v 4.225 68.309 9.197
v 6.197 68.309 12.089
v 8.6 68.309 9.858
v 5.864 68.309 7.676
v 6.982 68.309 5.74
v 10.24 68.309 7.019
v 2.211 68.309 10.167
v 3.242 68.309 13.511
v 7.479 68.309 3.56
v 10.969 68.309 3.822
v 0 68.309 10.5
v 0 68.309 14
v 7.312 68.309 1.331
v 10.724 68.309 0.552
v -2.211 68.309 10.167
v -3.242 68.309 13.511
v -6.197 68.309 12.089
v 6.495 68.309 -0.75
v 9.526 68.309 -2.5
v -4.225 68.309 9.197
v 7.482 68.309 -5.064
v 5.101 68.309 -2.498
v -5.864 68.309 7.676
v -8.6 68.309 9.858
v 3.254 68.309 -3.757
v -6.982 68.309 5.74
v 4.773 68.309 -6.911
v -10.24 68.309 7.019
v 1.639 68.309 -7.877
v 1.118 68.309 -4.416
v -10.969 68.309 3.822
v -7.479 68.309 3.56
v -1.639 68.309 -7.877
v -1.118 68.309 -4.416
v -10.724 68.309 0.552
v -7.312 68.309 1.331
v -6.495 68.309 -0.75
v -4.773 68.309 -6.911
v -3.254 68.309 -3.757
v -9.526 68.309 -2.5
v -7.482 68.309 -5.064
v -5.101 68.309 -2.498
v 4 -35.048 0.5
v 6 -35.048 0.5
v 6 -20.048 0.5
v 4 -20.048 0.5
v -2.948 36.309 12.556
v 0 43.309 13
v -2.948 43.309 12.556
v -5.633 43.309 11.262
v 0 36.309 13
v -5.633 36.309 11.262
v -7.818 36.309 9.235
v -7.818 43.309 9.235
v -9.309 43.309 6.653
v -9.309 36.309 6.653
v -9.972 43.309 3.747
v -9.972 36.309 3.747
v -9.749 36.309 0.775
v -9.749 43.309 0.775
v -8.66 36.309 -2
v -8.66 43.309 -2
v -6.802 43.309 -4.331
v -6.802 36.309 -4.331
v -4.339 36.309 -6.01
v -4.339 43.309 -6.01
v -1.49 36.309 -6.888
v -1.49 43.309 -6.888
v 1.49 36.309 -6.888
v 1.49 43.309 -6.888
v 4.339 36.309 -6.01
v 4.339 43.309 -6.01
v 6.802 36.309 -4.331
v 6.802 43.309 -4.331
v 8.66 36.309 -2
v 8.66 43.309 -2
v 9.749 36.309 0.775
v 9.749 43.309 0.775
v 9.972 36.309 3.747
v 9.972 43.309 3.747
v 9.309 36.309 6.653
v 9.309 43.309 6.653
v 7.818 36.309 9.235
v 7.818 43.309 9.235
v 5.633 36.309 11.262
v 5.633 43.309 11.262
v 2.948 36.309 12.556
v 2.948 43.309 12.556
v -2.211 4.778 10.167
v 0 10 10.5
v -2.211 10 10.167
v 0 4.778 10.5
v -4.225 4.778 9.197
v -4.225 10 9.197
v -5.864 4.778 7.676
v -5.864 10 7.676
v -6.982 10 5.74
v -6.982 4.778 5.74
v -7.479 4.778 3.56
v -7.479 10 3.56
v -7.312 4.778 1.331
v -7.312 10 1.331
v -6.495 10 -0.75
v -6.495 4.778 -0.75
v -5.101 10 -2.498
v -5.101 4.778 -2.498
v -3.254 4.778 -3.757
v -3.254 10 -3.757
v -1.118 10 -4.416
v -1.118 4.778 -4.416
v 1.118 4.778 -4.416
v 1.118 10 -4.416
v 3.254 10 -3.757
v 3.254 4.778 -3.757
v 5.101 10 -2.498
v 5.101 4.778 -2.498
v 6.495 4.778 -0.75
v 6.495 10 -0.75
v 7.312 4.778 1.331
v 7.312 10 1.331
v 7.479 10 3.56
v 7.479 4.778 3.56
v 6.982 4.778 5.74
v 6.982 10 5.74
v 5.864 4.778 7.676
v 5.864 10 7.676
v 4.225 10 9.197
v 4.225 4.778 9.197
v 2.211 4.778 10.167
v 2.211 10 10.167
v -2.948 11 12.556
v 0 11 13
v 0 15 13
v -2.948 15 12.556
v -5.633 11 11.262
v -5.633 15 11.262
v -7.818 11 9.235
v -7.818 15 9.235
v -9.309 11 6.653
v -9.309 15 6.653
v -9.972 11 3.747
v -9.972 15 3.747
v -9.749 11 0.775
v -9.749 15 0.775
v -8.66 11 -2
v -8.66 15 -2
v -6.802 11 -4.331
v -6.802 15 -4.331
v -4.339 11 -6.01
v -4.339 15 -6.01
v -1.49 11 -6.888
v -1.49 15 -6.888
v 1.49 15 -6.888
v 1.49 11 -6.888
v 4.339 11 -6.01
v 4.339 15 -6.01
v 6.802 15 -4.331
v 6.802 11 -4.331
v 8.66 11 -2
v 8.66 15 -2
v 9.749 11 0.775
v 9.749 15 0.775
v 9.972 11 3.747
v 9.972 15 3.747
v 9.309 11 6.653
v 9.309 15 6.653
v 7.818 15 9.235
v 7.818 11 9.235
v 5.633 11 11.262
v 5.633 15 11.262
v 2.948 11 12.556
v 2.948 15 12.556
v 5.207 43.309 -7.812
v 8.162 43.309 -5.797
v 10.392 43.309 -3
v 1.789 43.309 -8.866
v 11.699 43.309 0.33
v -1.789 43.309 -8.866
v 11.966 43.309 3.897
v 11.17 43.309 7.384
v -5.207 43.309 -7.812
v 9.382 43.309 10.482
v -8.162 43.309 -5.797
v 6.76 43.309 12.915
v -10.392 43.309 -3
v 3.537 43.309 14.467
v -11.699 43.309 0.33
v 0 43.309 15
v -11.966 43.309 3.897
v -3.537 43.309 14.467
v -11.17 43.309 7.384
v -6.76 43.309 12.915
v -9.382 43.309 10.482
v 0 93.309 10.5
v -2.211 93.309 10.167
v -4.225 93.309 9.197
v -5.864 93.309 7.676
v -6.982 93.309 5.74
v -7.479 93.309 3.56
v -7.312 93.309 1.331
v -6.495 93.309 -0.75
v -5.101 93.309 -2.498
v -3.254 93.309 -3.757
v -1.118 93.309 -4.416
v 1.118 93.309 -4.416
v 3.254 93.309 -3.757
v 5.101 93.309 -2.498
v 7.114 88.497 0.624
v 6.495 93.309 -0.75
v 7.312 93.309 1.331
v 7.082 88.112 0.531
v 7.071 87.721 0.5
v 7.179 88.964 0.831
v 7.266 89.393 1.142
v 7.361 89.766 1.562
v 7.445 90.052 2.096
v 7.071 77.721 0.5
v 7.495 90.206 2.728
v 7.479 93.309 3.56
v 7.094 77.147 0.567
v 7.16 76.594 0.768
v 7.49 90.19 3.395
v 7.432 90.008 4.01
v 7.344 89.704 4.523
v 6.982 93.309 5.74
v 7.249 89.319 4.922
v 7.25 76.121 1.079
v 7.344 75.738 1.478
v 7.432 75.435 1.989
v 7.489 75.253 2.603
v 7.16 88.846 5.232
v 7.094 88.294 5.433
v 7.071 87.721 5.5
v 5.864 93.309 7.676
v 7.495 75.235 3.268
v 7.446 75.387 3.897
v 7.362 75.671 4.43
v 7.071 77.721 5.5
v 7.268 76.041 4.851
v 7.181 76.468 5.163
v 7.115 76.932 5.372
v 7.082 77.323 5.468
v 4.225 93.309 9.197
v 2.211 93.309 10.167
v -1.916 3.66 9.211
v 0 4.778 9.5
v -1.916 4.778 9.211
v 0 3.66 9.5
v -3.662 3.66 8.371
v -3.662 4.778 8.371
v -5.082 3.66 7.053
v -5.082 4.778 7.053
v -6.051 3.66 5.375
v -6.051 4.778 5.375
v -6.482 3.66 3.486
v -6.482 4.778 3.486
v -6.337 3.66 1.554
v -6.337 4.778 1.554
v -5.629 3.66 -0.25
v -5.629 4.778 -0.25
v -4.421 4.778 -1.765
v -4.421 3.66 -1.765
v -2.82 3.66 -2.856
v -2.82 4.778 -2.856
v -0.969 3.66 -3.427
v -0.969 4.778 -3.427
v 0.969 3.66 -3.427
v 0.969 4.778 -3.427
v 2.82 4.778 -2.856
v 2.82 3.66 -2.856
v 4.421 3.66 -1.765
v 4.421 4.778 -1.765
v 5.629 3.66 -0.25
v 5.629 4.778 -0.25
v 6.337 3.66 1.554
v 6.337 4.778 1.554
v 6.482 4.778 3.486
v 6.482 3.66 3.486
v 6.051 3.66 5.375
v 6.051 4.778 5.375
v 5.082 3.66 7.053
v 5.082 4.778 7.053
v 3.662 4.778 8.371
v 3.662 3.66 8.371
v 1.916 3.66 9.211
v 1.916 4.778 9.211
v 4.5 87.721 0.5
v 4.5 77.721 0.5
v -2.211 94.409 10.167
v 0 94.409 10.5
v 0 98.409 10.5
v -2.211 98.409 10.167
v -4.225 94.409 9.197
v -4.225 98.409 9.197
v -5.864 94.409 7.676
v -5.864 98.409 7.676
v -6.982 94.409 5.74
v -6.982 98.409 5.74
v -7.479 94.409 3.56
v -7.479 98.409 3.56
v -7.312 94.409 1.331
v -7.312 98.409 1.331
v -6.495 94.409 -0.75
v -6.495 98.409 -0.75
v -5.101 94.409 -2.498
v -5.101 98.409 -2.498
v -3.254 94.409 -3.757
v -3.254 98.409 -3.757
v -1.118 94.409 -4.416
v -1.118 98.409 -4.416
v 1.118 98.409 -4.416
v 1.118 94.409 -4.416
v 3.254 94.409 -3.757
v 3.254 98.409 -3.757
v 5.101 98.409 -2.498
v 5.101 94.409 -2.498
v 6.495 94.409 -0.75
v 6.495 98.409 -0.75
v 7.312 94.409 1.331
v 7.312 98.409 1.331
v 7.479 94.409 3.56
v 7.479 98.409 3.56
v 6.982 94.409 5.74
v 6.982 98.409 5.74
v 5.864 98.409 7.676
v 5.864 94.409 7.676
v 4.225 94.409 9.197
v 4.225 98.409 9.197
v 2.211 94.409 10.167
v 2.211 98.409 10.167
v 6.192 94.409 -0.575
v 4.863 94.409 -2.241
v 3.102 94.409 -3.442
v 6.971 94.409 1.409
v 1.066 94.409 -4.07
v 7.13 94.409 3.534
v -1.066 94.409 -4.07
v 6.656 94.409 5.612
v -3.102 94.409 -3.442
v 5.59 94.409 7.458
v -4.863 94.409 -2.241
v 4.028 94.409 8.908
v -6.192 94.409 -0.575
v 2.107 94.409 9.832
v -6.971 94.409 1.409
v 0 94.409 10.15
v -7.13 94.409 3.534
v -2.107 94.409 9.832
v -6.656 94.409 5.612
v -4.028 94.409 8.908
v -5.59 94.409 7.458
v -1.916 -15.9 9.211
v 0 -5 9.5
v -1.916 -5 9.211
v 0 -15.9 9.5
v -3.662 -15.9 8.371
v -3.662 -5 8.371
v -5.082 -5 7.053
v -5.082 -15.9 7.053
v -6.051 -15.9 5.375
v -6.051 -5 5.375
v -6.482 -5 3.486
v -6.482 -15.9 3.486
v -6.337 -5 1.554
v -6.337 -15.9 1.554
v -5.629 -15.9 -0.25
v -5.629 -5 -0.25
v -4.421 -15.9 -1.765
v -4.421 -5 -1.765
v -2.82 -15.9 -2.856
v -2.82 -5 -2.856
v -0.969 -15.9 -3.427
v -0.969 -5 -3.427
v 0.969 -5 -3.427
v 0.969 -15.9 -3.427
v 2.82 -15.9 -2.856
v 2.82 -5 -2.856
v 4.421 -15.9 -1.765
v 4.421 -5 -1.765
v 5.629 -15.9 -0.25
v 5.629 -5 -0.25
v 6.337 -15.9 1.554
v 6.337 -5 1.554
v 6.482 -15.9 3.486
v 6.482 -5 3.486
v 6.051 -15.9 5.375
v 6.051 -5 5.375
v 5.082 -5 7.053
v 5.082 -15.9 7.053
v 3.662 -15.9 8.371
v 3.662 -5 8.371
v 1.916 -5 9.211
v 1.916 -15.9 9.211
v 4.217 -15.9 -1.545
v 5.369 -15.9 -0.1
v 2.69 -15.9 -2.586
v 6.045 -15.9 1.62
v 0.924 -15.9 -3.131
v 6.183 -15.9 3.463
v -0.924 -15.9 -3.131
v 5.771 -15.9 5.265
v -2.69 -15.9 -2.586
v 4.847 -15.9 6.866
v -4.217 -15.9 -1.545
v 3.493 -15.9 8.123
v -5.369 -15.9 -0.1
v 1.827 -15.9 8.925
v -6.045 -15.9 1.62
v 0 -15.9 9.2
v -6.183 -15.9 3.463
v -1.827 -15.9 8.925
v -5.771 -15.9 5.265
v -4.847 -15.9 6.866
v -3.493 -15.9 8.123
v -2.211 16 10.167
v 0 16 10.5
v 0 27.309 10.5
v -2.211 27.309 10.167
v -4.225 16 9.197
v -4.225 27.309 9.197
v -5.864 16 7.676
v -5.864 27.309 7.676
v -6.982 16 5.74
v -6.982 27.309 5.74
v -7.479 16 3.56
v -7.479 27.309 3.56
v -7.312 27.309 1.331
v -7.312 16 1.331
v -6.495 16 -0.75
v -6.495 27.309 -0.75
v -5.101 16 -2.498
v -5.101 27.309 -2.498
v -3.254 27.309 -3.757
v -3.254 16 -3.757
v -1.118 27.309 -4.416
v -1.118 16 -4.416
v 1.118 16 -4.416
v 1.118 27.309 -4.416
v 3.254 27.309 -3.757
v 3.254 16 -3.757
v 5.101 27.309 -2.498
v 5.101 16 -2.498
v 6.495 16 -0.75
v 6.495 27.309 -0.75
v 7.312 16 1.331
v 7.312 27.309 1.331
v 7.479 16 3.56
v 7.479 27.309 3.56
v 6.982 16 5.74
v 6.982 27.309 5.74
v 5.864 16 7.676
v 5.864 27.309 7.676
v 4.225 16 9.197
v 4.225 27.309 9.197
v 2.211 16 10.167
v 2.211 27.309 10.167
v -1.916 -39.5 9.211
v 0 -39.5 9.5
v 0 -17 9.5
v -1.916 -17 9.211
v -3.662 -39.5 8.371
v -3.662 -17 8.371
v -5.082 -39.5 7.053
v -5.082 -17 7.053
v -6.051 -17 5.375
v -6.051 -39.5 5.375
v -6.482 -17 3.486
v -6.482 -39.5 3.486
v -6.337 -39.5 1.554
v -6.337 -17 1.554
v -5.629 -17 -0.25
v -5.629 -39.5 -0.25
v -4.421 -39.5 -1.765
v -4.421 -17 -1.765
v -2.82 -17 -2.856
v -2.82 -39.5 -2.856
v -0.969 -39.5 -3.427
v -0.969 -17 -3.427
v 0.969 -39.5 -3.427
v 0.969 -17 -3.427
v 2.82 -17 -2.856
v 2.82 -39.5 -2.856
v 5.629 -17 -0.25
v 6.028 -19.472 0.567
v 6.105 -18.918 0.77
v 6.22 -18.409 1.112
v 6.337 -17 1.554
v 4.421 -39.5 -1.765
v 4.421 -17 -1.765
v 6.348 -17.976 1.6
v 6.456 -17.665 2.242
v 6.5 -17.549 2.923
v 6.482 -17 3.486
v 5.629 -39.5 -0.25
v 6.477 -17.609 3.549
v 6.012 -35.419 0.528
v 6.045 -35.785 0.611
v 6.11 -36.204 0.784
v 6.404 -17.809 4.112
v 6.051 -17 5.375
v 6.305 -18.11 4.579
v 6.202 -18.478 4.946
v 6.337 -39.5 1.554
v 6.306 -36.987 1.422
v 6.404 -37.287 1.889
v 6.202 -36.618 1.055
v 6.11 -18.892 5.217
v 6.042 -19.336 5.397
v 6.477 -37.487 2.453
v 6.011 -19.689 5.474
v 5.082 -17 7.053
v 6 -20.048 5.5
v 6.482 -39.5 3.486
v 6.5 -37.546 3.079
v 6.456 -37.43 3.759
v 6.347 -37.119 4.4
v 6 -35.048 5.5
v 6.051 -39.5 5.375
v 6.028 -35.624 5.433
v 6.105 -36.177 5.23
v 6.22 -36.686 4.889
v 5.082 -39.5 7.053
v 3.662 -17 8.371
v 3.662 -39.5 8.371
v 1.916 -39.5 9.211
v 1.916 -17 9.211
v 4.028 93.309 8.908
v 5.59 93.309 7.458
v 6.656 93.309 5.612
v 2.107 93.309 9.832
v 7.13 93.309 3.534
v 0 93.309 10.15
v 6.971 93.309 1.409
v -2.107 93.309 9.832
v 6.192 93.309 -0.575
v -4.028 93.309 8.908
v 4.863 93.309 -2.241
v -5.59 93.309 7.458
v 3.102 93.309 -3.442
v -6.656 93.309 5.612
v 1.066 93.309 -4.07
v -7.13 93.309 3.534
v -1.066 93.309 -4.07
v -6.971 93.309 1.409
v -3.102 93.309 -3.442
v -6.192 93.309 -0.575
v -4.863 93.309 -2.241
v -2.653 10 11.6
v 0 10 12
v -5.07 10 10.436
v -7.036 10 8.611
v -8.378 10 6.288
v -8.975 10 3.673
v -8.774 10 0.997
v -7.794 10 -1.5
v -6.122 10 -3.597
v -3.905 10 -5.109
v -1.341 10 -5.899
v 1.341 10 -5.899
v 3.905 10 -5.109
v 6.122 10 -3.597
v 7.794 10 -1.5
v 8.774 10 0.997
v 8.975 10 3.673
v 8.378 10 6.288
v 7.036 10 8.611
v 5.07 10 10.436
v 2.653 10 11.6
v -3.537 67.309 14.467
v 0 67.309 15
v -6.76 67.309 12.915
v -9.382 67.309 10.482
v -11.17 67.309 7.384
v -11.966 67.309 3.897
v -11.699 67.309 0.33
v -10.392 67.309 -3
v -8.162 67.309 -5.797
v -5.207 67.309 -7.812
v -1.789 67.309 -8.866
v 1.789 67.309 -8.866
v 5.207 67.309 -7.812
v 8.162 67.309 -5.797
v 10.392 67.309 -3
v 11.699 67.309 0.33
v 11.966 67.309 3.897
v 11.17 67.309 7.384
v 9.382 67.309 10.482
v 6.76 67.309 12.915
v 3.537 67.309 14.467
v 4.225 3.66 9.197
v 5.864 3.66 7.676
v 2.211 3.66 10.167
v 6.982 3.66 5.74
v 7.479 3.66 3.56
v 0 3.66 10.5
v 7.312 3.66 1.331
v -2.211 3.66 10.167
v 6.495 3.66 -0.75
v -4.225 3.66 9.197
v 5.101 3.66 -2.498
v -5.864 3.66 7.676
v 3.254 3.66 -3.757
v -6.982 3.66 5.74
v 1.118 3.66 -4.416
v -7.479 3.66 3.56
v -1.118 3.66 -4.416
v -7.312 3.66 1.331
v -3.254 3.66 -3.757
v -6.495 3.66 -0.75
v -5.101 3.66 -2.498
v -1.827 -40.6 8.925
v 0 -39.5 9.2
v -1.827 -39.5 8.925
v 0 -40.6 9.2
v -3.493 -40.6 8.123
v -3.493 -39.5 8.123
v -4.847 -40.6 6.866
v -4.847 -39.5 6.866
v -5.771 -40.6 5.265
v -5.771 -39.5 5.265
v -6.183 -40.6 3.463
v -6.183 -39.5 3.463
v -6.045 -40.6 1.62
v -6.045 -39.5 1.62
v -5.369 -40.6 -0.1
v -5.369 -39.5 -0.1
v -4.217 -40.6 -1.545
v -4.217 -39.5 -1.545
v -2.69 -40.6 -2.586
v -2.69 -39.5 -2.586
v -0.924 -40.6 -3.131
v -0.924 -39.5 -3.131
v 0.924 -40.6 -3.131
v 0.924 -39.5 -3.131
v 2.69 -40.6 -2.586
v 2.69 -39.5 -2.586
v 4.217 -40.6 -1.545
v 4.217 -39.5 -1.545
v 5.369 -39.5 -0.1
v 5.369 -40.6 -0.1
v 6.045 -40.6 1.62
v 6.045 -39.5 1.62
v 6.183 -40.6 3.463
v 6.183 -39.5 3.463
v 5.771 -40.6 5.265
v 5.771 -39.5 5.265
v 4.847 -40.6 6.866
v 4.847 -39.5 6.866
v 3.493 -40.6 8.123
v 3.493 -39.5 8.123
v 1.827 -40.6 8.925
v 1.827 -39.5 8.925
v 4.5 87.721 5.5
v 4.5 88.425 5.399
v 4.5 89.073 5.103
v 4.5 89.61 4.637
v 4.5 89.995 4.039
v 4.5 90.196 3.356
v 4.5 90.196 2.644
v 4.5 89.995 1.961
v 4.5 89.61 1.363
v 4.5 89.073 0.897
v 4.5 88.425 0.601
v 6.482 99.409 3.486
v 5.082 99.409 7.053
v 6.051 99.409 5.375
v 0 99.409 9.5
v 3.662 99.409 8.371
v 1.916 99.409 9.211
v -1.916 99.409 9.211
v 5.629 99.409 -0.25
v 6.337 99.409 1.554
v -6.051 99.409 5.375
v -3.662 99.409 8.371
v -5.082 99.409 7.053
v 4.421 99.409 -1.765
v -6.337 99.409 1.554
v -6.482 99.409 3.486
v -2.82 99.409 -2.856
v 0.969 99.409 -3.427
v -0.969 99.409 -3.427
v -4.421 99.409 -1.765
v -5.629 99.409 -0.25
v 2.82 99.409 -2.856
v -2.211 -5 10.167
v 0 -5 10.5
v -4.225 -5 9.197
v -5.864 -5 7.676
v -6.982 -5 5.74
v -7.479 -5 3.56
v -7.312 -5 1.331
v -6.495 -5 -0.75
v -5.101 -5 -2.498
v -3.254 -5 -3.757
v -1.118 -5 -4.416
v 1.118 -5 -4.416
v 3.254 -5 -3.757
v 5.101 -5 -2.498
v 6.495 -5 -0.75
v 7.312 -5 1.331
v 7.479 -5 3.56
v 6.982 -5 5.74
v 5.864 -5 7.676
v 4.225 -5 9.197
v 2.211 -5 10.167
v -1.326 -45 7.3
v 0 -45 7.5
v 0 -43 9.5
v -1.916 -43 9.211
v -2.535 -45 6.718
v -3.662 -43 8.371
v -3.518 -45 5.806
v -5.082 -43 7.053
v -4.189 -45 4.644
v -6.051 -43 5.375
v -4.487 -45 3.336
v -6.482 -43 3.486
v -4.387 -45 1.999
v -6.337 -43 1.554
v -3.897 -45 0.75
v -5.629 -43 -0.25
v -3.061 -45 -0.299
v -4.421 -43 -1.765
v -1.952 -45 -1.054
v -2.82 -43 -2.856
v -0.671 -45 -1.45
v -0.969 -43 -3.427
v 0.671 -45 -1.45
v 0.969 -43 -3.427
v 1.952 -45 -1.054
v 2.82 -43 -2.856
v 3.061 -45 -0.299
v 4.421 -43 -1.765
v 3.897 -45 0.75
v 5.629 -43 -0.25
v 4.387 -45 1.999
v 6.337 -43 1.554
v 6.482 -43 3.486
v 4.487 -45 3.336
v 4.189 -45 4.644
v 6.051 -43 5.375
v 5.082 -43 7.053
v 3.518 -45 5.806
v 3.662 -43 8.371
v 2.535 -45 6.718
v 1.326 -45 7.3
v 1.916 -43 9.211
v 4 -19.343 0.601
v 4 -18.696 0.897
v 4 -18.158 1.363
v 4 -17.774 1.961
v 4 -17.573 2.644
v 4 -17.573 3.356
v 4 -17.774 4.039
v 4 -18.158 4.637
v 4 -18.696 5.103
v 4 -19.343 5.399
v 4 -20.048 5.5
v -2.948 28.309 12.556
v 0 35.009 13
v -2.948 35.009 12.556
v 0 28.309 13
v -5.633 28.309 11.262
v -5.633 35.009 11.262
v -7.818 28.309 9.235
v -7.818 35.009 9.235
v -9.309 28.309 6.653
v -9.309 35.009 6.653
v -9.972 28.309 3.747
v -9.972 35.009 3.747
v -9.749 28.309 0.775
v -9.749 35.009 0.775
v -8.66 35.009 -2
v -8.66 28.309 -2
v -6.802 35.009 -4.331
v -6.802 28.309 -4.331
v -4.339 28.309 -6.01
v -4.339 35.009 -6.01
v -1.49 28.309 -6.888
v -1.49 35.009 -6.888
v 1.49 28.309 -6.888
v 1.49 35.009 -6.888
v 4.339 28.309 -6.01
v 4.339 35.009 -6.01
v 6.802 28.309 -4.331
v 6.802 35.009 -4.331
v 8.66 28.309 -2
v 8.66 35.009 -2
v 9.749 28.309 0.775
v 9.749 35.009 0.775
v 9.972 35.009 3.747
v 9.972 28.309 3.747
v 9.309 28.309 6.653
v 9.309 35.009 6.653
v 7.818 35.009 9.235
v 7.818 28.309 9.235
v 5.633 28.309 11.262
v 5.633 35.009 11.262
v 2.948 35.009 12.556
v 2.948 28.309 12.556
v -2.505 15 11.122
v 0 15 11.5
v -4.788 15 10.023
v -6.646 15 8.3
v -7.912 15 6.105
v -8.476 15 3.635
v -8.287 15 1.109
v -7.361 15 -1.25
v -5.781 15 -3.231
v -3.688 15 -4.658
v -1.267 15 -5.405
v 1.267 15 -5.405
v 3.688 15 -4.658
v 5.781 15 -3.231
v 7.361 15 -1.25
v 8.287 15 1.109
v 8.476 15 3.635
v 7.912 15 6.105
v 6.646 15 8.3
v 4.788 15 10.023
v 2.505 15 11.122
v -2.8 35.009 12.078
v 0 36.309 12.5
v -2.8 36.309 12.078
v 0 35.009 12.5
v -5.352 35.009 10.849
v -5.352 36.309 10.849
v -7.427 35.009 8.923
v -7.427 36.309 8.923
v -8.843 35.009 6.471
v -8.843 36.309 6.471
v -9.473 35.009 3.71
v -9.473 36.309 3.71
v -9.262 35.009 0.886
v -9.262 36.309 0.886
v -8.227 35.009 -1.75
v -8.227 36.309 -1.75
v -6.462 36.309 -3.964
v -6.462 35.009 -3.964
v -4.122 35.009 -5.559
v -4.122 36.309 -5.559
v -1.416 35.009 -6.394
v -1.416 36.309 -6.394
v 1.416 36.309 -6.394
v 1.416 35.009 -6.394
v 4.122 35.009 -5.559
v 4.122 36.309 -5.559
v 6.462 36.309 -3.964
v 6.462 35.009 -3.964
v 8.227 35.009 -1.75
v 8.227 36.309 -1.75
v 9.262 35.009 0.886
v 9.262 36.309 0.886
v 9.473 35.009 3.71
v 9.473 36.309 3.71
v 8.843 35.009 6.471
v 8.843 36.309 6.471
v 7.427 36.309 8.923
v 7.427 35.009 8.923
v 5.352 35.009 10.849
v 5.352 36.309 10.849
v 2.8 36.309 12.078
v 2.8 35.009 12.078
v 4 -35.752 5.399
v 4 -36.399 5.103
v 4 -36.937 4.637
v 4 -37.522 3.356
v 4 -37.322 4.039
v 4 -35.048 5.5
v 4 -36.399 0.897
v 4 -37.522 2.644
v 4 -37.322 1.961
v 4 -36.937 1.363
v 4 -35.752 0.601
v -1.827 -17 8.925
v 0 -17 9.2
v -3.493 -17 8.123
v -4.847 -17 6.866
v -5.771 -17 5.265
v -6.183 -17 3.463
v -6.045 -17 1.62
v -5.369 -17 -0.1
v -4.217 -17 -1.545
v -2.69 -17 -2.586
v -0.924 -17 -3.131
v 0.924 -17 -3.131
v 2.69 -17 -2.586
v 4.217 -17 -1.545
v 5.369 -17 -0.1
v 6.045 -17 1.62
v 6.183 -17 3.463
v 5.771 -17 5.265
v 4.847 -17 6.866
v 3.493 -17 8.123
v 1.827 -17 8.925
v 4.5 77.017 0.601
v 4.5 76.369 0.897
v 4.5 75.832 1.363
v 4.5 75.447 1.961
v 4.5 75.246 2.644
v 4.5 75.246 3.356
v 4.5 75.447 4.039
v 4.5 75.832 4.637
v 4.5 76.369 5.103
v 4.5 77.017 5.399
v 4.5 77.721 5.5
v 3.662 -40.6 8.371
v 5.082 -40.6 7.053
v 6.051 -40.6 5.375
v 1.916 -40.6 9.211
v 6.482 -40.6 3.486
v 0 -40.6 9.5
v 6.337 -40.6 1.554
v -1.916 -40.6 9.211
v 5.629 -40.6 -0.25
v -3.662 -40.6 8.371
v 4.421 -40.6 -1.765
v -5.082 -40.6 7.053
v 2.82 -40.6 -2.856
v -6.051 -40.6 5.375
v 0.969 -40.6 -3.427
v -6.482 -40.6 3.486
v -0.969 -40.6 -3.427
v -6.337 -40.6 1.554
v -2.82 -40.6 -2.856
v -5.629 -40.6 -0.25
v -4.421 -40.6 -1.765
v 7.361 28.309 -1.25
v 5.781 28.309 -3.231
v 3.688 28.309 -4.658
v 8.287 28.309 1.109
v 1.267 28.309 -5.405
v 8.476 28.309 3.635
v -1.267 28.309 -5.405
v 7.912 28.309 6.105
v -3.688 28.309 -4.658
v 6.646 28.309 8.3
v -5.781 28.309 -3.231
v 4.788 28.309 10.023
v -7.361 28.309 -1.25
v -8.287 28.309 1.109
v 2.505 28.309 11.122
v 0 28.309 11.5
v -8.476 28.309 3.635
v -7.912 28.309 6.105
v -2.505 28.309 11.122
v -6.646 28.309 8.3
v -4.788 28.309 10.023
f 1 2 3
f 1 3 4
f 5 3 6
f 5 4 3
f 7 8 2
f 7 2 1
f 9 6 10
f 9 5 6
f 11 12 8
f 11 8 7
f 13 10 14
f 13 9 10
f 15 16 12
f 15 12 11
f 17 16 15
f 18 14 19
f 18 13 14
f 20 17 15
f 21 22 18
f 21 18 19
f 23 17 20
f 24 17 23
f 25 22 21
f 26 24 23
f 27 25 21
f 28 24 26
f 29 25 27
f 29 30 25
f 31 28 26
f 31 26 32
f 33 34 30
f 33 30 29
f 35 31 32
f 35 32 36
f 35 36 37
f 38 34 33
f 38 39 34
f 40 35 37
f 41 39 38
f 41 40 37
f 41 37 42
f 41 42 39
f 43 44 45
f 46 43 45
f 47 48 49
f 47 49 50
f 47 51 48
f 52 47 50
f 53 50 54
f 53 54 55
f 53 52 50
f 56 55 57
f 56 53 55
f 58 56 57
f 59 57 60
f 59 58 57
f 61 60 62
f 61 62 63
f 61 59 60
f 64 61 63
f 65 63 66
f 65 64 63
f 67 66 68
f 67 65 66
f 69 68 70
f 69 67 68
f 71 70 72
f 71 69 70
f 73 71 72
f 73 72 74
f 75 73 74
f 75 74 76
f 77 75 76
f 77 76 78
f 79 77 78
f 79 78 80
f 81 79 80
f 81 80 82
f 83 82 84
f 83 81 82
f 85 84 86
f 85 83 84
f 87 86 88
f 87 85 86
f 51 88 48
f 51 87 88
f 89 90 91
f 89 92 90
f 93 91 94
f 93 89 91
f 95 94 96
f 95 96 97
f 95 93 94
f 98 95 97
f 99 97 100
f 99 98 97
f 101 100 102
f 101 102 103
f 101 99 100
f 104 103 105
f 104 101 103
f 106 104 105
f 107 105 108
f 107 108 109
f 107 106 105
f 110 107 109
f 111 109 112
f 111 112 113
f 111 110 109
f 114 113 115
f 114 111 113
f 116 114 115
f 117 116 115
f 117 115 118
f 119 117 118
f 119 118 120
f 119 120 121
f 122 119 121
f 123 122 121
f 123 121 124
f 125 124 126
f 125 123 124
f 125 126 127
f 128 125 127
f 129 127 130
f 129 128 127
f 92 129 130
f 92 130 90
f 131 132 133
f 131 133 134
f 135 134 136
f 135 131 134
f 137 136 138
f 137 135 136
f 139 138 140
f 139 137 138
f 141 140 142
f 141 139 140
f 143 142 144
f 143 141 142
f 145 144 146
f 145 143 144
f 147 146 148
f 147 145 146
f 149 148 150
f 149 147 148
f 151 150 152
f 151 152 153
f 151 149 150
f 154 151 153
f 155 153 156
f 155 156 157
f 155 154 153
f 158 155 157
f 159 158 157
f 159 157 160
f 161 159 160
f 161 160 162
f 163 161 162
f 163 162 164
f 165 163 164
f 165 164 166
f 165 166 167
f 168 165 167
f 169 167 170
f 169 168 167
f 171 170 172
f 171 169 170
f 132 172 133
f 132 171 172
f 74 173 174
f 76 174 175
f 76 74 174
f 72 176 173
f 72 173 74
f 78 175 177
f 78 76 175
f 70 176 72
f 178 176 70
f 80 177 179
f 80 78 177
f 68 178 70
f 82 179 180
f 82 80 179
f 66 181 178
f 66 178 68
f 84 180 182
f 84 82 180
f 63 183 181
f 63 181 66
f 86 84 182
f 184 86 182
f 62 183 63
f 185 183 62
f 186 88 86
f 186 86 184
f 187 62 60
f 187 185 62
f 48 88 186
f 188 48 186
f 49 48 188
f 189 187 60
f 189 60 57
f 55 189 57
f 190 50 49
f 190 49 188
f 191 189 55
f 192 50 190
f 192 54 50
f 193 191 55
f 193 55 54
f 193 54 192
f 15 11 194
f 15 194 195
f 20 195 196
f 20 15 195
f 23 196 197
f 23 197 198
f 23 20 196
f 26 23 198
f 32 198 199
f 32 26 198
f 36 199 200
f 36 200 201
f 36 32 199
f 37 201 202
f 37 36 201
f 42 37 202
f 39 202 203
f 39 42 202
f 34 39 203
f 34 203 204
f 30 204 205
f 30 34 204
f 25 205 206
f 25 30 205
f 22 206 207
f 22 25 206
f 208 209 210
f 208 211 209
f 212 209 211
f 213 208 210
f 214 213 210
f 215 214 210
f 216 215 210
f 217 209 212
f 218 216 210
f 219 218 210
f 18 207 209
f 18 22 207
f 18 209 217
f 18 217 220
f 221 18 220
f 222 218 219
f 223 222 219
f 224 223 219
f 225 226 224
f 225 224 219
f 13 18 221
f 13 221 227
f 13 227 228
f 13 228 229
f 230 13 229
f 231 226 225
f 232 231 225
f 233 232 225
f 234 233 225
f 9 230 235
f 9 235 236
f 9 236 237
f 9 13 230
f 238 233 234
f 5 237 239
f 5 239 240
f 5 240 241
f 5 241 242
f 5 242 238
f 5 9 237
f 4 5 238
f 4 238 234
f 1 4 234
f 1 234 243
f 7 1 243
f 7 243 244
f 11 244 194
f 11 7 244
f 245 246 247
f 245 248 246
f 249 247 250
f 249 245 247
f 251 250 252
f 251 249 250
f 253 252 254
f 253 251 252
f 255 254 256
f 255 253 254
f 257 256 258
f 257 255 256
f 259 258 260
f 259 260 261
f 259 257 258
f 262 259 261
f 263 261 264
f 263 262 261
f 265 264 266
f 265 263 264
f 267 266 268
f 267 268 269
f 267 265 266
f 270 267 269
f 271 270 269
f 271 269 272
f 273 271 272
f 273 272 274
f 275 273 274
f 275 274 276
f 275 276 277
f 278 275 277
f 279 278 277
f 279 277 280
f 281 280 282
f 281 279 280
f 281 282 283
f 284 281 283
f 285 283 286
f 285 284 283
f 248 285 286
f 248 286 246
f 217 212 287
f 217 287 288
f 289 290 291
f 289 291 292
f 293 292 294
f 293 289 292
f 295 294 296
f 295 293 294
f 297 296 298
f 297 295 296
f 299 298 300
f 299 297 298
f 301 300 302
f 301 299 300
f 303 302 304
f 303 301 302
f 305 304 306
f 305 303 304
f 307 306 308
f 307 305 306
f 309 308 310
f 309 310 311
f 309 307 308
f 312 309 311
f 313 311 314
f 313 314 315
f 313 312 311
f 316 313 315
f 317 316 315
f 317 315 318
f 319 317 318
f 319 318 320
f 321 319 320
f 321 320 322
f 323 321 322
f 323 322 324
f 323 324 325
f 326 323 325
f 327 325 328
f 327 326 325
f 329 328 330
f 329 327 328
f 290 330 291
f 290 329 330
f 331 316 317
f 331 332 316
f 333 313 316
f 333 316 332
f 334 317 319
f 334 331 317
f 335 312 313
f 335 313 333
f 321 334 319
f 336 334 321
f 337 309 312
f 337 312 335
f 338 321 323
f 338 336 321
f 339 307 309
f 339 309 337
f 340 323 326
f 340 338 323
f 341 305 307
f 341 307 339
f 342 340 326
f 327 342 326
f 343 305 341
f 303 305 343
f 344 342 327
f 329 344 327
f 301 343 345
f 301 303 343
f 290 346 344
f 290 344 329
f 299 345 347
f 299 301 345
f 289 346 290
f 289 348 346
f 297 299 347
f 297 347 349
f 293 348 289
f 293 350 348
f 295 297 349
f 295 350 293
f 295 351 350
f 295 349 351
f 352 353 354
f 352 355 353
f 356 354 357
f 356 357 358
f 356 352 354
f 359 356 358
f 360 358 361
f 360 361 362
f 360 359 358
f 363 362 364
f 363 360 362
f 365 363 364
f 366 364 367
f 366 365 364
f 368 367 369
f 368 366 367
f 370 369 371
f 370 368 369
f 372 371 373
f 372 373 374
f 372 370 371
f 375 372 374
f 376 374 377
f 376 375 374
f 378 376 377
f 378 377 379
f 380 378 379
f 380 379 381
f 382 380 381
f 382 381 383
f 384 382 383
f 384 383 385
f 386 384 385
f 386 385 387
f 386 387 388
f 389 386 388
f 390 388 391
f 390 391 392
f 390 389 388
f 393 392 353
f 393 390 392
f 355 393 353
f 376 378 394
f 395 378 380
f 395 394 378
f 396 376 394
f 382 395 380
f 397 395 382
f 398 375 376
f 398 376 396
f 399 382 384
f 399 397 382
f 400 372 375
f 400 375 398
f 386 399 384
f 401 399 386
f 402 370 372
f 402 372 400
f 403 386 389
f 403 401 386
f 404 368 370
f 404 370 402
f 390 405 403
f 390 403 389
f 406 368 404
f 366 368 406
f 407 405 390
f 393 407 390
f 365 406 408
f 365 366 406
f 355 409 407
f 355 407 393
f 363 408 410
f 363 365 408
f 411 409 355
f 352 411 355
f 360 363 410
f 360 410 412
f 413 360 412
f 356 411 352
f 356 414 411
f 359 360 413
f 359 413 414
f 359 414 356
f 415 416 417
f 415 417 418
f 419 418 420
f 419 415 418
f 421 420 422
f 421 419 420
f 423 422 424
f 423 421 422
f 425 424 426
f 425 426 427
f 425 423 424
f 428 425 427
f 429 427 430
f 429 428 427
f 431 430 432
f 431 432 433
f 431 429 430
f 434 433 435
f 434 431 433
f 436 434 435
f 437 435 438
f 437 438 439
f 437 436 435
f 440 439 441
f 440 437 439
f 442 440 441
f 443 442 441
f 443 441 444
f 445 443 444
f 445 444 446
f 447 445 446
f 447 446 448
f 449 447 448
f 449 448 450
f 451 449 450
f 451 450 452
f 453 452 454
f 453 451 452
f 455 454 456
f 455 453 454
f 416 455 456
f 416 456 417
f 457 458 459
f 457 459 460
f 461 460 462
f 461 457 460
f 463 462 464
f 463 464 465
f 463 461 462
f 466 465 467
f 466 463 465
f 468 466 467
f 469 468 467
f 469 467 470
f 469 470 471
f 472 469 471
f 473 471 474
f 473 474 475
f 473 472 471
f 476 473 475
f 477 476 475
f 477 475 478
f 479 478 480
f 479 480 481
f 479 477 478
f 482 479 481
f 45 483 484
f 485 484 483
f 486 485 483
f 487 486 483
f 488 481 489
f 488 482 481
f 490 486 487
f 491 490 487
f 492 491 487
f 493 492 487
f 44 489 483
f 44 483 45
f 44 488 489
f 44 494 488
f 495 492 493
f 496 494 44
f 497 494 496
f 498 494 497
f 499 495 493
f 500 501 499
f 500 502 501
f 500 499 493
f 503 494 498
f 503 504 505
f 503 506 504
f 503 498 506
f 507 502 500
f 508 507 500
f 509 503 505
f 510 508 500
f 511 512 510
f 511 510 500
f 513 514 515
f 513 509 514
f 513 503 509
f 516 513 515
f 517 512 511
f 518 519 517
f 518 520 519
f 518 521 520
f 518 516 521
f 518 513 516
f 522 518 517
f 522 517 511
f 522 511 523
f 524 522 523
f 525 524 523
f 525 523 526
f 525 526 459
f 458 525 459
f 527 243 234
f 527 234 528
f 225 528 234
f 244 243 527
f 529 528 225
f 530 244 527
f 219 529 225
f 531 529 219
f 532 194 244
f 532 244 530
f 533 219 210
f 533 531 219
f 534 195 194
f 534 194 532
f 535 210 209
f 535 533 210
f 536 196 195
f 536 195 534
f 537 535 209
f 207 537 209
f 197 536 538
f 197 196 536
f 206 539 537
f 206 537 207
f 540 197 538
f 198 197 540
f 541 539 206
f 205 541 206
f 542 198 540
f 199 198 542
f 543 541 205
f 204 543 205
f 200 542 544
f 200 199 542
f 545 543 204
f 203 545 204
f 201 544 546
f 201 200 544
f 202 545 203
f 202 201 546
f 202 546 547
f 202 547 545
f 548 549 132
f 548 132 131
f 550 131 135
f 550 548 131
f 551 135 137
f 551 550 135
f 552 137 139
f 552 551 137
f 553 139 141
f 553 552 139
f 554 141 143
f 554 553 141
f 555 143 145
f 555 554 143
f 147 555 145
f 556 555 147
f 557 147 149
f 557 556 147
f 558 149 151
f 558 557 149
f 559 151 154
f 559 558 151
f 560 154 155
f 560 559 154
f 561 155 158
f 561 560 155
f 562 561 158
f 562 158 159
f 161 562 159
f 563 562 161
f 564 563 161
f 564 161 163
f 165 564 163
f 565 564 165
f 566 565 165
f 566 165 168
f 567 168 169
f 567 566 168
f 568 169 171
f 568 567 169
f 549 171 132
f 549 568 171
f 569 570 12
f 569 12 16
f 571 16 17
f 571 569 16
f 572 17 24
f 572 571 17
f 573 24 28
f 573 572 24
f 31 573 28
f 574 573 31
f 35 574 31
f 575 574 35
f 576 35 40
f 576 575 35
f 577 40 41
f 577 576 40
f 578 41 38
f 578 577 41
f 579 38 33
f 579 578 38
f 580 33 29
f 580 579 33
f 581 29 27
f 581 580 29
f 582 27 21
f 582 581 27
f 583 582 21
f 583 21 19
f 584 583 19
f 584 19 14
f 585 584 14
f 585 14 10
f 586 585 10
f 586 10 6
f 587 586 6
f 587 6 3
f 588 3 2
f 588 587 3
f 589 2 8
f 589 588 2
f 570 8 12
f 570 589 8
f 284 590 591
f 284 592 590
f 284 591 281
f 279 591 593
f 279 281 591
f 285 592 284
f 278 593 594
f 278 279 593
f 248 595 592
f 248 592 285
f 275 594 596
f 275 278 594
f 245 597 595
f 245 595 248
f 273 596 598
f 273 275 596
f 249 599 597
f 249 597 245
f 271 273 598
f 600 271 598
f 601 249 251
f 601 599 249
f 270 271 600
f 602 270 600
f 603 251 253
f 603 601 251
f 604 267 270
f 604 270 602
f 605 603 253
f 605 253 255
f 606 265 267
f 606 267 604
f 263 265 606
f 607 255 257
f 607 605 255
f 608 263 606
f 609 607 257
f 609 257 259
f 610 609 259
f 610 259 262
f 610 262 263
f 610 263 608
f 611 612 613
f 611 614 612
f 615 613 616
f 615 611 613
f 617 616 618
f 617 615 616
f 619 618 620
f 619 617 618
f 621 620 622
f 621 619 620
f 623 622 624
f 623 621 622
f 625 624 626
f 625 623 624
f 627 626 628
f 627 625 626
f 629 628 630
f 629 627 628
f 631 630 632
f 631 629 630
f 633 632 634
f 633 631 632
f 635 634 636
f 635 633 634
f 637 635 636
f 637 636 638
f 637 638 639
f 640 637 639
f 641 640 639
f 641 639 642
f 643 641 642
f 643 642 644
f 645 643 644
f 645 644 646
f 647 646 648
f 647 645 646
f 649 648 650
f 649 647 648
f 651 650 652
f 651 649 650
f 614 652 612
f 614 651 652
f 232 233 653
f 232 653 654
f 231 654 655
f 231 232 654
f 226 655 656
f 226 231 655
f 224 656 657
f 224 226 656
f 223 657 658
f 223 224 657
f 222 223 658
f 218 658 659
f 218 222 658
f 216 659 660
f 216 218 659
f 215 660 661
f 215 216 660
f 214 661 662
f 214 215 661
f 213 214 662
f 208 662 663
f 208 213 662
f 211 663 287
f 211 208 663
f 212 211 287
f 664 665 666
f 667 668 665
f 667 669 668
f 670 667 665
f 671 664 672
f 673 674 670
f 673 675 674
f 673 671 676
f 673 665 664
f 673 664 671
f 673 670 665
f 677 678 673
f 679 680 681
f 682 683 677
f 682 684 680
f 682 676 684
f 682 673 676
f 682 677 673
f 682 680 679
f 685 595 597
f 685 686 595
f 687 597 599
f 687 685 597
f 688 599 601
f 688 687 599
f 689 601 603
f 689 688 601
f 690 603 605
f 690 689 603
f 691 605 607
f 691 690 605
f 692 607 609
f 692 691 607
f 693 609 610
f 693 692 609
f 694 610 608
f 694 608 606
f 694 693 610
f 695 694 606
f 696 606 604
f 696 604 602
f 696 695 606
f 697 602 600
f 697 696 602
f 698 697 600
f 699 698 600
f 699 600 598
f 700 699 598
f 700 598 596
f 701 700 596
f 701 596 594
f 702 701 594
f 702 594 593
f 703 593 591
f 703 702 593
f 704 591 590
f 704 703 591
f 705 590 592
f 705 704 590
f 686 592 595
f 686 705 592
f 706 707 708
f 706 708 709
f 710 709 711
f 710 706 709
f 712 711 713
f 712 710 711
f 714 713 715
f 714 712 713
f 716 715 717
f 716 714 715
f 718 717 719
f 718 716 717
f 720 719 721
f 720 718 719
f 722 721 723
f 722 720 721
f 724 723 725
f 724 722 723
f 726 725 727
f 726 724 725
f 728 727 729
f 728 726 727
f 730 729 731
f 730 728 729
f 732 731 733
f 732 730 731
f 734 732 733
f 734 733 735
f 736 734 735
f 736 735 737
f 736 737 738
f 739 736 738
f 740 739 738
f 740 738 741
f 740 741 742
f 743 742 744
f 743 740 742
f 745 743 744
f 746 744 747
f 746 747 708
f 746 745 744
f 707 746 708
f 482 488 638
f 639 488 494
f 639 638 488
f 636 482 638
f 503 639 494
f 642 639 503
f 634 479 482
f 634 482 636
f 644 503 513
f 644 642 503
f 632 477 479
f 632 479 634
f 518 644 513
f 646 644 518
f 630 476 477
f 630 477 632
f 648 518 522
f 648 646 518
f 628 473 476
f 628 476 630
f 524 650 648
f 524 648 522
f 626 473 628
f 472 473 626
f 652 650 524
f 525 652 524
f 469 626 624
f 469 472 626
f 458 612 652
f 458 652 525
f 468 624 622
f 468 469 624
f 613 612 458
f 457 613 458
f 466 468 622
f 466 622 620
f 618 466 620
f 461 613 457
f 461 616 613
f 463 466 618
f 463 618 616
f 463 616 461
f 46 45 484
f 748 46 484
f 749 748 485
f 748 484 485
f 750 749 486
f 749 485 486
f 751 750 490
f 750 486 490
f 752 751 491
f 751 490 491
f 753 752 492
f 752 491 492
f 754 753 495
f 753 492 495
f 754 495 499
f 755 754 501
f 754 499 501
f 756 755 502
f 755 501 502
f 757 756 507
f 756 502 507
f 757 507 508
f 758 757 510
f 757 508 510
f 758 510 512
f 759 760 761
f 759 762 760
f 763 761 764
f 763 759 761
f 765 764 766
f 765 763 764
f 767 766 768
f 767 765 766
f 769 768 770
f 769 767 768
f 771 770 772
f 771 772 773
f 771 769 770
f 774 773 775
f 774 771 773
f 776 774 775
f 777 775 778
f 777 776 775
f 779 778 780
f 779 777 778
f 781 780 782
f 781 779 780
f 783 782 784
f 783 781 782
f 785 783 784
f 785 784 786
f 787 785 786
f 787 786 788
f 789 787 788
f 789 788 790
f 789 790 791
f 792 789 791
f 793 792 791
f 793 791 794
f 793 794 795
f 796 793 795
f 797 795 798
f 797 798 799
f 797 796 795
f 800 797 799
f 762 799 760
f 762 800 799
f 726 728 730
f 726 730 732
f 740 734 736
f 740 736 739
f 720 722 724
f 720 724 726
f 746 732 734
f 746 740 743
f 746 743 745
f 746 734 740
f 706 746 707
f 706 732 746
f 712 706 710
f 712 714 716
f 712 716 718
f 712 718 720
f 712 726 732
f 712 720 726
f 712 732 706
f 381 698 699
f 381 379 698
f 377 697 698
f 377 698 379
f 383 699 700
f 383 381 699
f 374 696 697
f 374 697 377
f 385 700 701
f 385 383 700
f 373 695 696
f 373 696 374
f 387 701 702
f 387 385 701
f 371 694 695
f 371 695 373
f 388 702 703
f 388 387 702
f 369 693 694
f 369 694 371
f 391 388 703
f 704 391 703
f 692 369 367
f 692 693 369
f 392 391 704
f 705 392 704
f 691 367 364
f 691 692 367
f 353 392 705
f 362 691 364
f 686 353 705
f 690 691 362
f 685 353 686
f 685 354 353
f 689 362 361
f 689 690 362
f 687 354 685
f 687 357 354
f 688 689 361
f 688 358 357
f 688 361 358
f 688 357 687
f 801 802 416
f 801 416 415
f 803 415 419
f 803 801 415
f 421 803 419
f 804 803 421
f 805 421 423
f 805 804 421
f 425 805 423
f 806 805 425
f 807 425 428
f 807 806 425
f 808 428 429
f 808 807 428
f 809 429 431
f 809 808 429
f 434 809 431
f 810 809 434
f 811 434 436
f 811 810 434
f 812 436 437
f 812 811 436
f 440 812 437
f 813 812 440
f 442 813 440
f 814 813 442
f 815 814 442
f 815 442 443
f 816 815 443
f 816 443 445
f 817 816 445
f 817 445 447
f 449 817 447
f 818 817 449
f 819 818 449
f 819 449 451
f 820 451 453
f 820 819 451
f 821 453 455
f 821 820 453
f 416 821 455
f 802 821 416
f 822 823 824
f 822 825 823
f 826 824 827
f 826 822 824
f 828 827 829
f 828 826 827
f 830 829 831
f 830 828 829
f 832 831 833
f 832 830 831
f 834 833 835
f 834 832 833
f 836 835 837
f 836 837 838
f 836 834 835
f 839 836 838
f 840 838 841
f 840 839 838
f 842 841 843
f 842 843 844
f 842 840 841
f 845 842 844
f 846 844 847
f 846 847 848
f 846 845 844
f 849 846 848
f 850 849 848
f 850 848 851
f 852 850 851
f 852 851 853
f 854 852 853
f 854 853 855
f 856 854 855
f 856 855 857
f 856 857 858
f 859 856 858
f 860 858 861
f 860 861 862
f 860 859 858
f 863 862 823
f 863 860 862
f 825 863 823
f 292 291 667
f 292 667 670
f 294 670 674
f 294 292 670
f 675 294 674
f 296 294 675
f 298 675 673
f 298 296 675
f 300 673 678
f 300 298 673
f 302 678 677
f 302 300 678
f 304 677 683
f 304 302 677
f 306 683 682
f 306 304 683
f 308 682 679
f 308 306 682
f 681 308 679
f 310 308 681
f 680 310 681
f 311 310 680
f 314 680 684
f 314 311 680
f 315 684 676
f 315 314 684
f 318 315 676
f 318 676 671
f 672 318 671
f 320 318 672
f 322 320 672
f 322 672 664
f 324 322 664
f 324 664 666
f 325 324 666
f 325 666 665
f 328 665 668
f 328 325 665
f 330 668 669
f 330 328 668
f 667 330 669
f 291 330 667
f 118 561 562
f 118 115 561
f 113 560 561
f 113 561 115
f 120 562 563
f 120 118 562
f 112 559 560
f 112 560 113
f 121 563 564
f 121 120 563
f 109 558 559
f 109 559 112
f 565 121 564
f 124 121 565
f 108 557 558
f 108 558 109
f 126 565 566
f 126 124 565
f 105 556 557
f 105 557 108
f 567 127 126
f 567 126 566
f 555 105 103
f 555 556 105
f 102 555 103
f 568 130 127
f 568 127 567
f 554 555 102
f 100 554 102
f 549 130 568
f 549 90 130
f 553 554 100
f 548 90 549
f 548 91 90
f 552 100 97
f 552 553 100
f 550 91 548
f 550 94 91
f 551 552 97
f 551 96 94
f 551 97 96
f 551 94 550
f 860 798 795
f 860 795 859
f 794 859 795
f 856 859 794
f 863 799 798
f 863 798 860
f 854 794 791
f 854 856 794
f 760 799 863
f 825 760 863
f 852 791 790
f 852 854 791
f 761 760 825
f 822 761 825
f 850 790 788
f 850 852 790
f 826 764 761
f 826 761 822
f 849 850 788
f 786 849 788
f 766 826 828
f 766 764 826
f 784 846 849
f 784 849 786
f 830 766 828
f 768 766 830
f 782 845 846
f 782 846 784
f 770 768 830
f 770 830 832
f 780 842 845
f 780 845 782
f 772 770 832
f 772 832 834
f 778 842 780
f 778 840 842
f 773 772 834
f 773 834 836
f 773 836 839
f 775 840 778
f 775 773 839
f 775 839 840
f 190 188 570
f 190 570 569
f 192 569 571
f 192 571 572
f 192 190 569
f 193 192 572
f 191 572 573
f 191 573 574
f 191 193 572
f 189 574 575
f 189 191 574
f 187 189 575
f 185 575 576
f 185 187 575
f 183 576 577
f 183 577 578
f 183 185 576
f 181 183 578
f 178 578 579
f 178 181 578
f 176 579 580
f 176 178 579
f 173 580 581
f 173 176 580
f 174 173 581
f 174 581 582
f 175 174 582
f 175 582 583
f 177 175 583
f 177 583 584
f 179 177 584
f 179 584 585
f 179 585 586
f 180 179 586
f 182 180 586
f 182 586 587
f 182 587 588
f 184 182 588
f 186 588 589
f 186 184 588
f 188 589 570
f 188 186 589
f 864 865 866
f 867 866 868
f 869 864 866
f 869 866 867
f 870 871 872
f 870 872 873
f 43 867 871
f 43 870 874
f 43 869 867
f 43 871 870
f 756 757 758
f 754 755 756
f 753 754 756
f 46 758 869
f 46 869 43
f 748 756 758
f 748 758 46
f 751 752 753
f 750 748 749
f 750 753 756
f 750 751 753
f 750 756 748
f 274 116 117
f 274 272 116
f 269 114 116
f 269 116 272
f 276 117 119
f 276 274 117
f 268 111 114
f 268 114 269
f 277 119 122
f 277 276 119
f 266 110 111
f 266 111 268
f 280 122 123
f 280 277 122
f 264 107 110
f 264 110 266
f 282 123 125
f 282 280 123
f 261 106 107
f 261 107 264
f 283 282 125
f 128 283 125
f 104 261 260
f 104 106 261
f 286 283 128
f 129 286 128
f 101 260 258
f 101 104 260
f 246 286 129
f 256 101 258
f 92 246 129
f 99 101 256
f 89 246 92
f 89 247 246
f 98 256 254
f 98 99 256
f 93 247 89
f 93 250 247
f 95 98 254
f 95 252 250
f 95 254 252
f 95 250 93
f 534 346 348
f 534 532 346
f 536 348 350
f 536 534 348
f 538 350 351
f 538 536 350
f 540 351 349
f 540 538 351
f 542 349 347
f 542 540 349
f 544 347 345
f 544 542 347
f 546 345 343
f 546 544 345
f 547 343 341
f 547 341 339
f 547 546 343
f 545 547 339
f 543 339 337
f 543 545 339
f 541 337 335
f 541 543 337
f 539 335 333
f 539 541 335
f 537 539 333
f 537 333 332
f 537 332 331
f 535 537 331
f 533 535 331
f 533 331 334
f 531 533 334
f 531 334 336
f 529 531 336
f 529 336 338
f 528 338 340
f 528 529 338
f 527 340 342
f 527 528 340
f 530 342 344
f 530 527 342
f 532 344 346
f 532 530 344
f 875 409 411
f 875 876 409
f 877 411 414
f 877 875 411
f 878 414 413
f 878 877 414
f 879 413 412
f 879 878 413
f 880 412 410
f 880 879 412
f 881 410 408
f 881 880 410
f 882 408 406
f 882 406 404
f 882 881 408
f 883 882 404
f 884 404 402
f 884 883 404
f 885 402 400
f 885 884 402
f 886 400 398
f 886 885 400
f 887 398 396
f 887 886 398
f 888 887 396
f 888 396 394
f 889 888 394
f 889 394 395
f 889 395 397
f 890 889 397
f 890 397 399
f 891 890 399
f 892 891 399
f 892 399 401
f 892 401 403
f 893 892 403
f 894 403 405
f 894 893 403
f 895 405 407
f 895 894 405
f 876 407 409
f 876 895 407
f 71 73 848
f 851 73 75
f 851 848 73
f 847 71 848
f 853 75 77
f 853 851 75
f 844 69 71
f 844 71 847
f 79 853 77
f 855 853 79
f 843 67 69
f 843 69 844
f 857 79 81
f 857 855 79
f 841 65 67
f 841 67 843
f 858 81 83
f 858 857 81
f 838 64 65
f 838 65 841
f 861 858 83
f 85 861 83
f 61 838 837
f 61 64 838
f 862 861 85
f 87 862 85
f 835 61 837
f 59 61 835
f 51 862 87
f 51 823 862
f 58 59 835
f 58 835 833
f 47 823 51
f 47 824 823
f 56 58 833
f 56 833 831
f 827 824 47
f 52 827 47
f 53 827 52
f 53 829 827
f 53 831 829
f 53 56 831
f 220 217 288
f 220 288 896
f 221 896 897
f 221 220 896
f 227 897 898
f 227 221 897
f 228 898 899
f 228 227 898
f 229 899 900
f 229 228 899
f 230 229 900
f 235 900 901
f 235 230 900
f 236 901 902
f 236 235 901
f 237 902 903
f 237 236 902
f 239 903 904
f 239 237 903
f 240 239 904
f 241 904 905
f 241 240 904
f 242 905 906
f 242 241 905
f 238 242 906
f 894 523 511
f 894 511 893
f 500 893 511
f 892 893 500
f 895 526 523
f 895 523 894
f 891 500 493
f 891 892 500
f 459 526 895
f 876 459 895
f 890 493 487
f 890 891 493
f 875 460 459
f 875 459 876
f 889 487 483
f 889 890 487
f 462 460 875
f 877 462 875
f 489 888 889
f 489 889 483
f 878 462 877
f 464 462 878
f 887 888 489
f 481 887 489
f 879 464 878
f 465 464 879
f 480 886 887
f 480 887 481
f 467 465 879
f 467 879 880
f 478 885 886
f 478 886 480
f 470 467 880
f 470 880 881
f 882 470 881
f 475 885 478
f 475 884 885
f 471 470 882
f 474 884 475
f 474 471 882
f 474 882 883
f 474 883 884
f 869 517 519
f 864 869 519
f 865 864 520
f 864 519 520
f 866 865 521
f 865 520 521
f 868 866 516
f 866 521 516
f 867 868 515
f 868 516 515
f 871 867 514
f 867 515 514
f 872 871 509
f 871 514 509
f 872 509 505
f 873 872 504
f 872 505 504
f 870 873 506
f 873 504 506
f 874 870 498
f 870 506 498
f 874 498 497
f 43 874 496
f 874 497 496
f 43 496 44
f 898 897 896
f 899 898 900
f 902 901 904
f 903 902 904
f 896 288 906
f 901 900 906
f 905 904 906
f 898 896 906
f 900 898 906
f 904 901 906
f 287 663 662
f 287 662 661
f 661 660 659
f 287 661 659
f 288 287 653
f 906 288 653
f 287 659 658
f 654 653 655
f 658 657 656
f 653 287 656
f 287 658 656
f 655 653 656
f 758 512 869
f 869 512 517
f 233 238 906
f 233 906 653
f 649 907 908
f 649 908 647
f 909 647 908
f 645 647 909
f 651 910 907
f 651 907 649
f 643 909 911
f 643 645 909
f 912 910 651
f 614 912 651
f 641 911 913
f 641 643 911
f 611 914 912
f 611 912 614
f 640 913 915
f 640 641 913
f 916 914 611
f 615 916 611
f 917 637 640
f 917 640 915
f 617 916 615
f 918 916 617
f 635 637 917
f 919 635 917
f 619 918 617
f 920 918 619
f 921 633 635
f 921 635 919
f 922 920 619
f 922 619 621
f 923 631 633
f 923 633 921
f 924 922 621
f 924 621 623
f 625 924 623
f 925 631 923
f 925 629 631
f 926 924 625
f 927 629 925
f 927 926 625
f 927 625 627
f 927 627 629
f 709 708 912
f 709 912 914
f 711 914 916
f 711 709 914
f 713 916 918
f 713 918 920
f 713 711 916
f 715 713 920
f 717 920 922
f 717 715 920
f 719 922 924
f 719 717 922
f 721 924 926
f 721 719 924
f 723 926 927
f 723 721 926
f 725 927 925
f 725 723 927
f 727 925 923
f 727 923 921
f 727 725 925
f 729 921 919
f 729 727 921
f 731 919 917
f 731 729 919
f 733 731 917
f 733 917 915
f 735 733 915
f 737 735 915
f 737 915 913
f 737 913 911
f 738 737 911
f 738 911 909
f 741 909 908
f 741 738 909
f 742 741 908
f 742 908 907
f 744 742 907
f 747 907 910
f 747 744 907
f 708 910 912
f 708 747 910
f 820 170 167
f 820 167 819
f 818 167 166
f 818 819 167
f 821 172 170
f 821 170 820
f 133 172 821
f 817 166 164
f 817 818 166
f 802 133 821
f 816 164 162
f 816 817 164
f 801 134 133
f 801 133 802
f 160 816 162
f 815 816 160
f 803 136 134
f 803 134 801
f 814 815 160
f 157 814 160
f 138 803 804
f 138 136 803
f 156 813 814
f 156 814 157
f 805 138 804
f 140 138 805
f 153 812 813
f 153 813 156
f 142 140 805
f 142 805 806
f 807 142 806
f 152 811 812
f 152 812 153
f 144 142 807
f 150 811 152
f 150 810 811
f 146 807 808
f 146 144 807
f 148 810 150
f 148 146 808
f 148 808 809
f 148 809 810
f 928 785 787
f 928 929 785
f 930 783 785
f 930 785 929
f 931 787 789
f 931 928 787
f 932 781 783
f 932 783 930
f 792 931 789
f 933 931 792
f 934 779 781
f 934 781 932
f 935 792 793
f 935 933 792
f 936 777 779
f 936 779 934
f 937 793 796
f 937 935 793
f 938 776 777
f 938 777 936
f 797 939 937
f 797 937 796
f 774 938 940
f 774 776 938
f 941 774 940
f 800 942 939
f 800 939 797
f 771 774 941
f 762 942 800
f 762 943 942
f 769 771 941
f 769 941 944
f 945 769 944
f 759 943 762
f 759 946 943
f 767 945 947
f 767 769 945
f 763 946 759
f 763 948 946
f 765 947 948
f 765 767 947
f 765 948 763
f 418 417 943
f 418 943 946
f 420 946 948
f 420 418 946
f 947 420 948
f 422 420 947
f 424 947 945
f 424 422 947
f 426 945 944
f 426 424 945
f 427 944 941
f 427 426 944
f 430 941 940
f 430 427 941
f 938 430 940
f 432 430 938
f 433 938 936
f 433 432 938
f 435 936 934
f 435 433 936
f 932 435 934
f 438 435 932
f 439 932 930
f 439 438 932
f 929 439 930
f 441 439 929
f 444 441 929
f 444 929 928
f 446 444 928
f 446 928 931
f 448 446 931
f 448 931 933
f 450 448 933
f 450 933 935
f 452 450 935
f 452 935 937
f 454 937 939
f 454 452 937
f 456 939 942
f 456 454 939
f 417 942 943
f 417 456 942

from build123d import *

# Parameters (mm, degrees)
SFAZOWANIE2_SIZE           = 1
WYTNIJ_WYCI_GNI_CIE1_DEPTH = 5.5
WYTNIJ_WYCI_GNI_CIE2_DEPTH = 6
SFAZOWANIE3_SIZE           = 2


with BuildPart() as part:
    # Szkic1 → Obrót1 (revolve)
    with BuildSketch(Plane(origin=(0, 0, 0), x_dir=(0, 0, -1), z_dir=(1, 0, 0))):
        Polygon((-3, -6.188308688), (-3, 99.409284105), (-10.5, 99.409284105), (-10.5, 94.409284105), (-10.15, 94.409284105), (-10.15, 93.309284105), (-10.5, 93.309284105), (-10.5, 68.309284105), (-15, 68.309284105), (-15, 43.309284105), (-13, 43.309284105), (-13, 36.309284105), (-12.5, 36.309284105), (-12.5, 35.009284105), (-13, 35.009284105), (-13, 28.309284105), (-10.5, 28.309284105), (-10.5, 15), (-13, 15), (-13, 10), (-10.5, 10), (-10.5, 4.778207376), (-9.5, 4.778207376), (-9.5, 3.660040364), (-10.5, 3.660040364), (-10.5, -5), (-9.5, -5), (-9.5, -15.9), (-9.2, -15.9), (-9.2, -17), (-9.5, -17), (-9.5, -39.5), (-9.2, -39.5), (-9.2, -40.6), (-9.5, -40.6), (-9.5, -45), (-3, -45), (-3, -6.690715895), align=None)
    revolve(axis=Axis((0, 99.409284105, 3), (0, -1, 0)))

    # Sfazowanie2
    sfazowanie2_edges = [part.edges().sort_by_distance(p)[0] for p in [
        (0, 10, -7),
        (0, 15, -4.5),
        (0, 28.309284105, -4.5),
        (0, 68.309284105, -9),
        (0, 99.409284105, -4.5),
    ]]
    chamfer(sfazowanie2_edges, length=SFAZOWANIE2_SIZE)

    # Szkic2 → Wytnij-wyciągnięcie1 (cut)
    with BuildSketch(Plane(origin=(10, 0, 0), x_dir=(0, 0, -1), z_dir=(1, 0, 0))):
        with BuildLine():
            Line((-0.5, 87.721044176), (-0.5, 77.721044176))
            ThreePointArc((-0.5, 77.721044176), (-3, 75.221044176), (-5.5, 77.721044176))
            Line((-5.5, 77.721044176), (-5.5, 87.721044176))
            ThreePointArc((-5.5, 87.721044176), (-3, 90.221044176), (-0.5, 87.721044176))
        make_face()
    extrude(amount=-WYTNIJ_WYCI_GNI_CIE1_DEPTH, mode=Mode.SUBTRACT)

    # Szkic2<4> → Wytnij-wyciągnięcie2 (cut)
    with BuildSketch(Plane(origin=(10, 0, 0), x_dir=(0, 0, -1), z_dir=(1, 0, 0))):
        with BuildLine():
            Line((-5.5, -20.047619848), (-5.5, -35.047619848))
            ThreePointArc((-5.5, -35.047619848), (-3, -37.547619848), (-0.5, -35.047619848))
            Line((-0.5, -35.047619848), (-0.5, -20.047619848))
            ThreePointArc((-0.5, -20.047619848), (-3, -17.547619848), (-5.5, -20.047619848))
        make_face()
    extrude(amount=-WYTNIJ_WYCI_GNI_CIE2_DEPTH, mode=Mode.SUBTRACT)

    # Sfazowanie3
    sfazowanie3_edges = [part.edges().sort_by_distance(p)[0] for p in [
        (0, -45, -3.5),
    ]]
    chamfer(sfazowanie3_edges, length=SFAZOWANIE3_SIZE)


solid = part.part
